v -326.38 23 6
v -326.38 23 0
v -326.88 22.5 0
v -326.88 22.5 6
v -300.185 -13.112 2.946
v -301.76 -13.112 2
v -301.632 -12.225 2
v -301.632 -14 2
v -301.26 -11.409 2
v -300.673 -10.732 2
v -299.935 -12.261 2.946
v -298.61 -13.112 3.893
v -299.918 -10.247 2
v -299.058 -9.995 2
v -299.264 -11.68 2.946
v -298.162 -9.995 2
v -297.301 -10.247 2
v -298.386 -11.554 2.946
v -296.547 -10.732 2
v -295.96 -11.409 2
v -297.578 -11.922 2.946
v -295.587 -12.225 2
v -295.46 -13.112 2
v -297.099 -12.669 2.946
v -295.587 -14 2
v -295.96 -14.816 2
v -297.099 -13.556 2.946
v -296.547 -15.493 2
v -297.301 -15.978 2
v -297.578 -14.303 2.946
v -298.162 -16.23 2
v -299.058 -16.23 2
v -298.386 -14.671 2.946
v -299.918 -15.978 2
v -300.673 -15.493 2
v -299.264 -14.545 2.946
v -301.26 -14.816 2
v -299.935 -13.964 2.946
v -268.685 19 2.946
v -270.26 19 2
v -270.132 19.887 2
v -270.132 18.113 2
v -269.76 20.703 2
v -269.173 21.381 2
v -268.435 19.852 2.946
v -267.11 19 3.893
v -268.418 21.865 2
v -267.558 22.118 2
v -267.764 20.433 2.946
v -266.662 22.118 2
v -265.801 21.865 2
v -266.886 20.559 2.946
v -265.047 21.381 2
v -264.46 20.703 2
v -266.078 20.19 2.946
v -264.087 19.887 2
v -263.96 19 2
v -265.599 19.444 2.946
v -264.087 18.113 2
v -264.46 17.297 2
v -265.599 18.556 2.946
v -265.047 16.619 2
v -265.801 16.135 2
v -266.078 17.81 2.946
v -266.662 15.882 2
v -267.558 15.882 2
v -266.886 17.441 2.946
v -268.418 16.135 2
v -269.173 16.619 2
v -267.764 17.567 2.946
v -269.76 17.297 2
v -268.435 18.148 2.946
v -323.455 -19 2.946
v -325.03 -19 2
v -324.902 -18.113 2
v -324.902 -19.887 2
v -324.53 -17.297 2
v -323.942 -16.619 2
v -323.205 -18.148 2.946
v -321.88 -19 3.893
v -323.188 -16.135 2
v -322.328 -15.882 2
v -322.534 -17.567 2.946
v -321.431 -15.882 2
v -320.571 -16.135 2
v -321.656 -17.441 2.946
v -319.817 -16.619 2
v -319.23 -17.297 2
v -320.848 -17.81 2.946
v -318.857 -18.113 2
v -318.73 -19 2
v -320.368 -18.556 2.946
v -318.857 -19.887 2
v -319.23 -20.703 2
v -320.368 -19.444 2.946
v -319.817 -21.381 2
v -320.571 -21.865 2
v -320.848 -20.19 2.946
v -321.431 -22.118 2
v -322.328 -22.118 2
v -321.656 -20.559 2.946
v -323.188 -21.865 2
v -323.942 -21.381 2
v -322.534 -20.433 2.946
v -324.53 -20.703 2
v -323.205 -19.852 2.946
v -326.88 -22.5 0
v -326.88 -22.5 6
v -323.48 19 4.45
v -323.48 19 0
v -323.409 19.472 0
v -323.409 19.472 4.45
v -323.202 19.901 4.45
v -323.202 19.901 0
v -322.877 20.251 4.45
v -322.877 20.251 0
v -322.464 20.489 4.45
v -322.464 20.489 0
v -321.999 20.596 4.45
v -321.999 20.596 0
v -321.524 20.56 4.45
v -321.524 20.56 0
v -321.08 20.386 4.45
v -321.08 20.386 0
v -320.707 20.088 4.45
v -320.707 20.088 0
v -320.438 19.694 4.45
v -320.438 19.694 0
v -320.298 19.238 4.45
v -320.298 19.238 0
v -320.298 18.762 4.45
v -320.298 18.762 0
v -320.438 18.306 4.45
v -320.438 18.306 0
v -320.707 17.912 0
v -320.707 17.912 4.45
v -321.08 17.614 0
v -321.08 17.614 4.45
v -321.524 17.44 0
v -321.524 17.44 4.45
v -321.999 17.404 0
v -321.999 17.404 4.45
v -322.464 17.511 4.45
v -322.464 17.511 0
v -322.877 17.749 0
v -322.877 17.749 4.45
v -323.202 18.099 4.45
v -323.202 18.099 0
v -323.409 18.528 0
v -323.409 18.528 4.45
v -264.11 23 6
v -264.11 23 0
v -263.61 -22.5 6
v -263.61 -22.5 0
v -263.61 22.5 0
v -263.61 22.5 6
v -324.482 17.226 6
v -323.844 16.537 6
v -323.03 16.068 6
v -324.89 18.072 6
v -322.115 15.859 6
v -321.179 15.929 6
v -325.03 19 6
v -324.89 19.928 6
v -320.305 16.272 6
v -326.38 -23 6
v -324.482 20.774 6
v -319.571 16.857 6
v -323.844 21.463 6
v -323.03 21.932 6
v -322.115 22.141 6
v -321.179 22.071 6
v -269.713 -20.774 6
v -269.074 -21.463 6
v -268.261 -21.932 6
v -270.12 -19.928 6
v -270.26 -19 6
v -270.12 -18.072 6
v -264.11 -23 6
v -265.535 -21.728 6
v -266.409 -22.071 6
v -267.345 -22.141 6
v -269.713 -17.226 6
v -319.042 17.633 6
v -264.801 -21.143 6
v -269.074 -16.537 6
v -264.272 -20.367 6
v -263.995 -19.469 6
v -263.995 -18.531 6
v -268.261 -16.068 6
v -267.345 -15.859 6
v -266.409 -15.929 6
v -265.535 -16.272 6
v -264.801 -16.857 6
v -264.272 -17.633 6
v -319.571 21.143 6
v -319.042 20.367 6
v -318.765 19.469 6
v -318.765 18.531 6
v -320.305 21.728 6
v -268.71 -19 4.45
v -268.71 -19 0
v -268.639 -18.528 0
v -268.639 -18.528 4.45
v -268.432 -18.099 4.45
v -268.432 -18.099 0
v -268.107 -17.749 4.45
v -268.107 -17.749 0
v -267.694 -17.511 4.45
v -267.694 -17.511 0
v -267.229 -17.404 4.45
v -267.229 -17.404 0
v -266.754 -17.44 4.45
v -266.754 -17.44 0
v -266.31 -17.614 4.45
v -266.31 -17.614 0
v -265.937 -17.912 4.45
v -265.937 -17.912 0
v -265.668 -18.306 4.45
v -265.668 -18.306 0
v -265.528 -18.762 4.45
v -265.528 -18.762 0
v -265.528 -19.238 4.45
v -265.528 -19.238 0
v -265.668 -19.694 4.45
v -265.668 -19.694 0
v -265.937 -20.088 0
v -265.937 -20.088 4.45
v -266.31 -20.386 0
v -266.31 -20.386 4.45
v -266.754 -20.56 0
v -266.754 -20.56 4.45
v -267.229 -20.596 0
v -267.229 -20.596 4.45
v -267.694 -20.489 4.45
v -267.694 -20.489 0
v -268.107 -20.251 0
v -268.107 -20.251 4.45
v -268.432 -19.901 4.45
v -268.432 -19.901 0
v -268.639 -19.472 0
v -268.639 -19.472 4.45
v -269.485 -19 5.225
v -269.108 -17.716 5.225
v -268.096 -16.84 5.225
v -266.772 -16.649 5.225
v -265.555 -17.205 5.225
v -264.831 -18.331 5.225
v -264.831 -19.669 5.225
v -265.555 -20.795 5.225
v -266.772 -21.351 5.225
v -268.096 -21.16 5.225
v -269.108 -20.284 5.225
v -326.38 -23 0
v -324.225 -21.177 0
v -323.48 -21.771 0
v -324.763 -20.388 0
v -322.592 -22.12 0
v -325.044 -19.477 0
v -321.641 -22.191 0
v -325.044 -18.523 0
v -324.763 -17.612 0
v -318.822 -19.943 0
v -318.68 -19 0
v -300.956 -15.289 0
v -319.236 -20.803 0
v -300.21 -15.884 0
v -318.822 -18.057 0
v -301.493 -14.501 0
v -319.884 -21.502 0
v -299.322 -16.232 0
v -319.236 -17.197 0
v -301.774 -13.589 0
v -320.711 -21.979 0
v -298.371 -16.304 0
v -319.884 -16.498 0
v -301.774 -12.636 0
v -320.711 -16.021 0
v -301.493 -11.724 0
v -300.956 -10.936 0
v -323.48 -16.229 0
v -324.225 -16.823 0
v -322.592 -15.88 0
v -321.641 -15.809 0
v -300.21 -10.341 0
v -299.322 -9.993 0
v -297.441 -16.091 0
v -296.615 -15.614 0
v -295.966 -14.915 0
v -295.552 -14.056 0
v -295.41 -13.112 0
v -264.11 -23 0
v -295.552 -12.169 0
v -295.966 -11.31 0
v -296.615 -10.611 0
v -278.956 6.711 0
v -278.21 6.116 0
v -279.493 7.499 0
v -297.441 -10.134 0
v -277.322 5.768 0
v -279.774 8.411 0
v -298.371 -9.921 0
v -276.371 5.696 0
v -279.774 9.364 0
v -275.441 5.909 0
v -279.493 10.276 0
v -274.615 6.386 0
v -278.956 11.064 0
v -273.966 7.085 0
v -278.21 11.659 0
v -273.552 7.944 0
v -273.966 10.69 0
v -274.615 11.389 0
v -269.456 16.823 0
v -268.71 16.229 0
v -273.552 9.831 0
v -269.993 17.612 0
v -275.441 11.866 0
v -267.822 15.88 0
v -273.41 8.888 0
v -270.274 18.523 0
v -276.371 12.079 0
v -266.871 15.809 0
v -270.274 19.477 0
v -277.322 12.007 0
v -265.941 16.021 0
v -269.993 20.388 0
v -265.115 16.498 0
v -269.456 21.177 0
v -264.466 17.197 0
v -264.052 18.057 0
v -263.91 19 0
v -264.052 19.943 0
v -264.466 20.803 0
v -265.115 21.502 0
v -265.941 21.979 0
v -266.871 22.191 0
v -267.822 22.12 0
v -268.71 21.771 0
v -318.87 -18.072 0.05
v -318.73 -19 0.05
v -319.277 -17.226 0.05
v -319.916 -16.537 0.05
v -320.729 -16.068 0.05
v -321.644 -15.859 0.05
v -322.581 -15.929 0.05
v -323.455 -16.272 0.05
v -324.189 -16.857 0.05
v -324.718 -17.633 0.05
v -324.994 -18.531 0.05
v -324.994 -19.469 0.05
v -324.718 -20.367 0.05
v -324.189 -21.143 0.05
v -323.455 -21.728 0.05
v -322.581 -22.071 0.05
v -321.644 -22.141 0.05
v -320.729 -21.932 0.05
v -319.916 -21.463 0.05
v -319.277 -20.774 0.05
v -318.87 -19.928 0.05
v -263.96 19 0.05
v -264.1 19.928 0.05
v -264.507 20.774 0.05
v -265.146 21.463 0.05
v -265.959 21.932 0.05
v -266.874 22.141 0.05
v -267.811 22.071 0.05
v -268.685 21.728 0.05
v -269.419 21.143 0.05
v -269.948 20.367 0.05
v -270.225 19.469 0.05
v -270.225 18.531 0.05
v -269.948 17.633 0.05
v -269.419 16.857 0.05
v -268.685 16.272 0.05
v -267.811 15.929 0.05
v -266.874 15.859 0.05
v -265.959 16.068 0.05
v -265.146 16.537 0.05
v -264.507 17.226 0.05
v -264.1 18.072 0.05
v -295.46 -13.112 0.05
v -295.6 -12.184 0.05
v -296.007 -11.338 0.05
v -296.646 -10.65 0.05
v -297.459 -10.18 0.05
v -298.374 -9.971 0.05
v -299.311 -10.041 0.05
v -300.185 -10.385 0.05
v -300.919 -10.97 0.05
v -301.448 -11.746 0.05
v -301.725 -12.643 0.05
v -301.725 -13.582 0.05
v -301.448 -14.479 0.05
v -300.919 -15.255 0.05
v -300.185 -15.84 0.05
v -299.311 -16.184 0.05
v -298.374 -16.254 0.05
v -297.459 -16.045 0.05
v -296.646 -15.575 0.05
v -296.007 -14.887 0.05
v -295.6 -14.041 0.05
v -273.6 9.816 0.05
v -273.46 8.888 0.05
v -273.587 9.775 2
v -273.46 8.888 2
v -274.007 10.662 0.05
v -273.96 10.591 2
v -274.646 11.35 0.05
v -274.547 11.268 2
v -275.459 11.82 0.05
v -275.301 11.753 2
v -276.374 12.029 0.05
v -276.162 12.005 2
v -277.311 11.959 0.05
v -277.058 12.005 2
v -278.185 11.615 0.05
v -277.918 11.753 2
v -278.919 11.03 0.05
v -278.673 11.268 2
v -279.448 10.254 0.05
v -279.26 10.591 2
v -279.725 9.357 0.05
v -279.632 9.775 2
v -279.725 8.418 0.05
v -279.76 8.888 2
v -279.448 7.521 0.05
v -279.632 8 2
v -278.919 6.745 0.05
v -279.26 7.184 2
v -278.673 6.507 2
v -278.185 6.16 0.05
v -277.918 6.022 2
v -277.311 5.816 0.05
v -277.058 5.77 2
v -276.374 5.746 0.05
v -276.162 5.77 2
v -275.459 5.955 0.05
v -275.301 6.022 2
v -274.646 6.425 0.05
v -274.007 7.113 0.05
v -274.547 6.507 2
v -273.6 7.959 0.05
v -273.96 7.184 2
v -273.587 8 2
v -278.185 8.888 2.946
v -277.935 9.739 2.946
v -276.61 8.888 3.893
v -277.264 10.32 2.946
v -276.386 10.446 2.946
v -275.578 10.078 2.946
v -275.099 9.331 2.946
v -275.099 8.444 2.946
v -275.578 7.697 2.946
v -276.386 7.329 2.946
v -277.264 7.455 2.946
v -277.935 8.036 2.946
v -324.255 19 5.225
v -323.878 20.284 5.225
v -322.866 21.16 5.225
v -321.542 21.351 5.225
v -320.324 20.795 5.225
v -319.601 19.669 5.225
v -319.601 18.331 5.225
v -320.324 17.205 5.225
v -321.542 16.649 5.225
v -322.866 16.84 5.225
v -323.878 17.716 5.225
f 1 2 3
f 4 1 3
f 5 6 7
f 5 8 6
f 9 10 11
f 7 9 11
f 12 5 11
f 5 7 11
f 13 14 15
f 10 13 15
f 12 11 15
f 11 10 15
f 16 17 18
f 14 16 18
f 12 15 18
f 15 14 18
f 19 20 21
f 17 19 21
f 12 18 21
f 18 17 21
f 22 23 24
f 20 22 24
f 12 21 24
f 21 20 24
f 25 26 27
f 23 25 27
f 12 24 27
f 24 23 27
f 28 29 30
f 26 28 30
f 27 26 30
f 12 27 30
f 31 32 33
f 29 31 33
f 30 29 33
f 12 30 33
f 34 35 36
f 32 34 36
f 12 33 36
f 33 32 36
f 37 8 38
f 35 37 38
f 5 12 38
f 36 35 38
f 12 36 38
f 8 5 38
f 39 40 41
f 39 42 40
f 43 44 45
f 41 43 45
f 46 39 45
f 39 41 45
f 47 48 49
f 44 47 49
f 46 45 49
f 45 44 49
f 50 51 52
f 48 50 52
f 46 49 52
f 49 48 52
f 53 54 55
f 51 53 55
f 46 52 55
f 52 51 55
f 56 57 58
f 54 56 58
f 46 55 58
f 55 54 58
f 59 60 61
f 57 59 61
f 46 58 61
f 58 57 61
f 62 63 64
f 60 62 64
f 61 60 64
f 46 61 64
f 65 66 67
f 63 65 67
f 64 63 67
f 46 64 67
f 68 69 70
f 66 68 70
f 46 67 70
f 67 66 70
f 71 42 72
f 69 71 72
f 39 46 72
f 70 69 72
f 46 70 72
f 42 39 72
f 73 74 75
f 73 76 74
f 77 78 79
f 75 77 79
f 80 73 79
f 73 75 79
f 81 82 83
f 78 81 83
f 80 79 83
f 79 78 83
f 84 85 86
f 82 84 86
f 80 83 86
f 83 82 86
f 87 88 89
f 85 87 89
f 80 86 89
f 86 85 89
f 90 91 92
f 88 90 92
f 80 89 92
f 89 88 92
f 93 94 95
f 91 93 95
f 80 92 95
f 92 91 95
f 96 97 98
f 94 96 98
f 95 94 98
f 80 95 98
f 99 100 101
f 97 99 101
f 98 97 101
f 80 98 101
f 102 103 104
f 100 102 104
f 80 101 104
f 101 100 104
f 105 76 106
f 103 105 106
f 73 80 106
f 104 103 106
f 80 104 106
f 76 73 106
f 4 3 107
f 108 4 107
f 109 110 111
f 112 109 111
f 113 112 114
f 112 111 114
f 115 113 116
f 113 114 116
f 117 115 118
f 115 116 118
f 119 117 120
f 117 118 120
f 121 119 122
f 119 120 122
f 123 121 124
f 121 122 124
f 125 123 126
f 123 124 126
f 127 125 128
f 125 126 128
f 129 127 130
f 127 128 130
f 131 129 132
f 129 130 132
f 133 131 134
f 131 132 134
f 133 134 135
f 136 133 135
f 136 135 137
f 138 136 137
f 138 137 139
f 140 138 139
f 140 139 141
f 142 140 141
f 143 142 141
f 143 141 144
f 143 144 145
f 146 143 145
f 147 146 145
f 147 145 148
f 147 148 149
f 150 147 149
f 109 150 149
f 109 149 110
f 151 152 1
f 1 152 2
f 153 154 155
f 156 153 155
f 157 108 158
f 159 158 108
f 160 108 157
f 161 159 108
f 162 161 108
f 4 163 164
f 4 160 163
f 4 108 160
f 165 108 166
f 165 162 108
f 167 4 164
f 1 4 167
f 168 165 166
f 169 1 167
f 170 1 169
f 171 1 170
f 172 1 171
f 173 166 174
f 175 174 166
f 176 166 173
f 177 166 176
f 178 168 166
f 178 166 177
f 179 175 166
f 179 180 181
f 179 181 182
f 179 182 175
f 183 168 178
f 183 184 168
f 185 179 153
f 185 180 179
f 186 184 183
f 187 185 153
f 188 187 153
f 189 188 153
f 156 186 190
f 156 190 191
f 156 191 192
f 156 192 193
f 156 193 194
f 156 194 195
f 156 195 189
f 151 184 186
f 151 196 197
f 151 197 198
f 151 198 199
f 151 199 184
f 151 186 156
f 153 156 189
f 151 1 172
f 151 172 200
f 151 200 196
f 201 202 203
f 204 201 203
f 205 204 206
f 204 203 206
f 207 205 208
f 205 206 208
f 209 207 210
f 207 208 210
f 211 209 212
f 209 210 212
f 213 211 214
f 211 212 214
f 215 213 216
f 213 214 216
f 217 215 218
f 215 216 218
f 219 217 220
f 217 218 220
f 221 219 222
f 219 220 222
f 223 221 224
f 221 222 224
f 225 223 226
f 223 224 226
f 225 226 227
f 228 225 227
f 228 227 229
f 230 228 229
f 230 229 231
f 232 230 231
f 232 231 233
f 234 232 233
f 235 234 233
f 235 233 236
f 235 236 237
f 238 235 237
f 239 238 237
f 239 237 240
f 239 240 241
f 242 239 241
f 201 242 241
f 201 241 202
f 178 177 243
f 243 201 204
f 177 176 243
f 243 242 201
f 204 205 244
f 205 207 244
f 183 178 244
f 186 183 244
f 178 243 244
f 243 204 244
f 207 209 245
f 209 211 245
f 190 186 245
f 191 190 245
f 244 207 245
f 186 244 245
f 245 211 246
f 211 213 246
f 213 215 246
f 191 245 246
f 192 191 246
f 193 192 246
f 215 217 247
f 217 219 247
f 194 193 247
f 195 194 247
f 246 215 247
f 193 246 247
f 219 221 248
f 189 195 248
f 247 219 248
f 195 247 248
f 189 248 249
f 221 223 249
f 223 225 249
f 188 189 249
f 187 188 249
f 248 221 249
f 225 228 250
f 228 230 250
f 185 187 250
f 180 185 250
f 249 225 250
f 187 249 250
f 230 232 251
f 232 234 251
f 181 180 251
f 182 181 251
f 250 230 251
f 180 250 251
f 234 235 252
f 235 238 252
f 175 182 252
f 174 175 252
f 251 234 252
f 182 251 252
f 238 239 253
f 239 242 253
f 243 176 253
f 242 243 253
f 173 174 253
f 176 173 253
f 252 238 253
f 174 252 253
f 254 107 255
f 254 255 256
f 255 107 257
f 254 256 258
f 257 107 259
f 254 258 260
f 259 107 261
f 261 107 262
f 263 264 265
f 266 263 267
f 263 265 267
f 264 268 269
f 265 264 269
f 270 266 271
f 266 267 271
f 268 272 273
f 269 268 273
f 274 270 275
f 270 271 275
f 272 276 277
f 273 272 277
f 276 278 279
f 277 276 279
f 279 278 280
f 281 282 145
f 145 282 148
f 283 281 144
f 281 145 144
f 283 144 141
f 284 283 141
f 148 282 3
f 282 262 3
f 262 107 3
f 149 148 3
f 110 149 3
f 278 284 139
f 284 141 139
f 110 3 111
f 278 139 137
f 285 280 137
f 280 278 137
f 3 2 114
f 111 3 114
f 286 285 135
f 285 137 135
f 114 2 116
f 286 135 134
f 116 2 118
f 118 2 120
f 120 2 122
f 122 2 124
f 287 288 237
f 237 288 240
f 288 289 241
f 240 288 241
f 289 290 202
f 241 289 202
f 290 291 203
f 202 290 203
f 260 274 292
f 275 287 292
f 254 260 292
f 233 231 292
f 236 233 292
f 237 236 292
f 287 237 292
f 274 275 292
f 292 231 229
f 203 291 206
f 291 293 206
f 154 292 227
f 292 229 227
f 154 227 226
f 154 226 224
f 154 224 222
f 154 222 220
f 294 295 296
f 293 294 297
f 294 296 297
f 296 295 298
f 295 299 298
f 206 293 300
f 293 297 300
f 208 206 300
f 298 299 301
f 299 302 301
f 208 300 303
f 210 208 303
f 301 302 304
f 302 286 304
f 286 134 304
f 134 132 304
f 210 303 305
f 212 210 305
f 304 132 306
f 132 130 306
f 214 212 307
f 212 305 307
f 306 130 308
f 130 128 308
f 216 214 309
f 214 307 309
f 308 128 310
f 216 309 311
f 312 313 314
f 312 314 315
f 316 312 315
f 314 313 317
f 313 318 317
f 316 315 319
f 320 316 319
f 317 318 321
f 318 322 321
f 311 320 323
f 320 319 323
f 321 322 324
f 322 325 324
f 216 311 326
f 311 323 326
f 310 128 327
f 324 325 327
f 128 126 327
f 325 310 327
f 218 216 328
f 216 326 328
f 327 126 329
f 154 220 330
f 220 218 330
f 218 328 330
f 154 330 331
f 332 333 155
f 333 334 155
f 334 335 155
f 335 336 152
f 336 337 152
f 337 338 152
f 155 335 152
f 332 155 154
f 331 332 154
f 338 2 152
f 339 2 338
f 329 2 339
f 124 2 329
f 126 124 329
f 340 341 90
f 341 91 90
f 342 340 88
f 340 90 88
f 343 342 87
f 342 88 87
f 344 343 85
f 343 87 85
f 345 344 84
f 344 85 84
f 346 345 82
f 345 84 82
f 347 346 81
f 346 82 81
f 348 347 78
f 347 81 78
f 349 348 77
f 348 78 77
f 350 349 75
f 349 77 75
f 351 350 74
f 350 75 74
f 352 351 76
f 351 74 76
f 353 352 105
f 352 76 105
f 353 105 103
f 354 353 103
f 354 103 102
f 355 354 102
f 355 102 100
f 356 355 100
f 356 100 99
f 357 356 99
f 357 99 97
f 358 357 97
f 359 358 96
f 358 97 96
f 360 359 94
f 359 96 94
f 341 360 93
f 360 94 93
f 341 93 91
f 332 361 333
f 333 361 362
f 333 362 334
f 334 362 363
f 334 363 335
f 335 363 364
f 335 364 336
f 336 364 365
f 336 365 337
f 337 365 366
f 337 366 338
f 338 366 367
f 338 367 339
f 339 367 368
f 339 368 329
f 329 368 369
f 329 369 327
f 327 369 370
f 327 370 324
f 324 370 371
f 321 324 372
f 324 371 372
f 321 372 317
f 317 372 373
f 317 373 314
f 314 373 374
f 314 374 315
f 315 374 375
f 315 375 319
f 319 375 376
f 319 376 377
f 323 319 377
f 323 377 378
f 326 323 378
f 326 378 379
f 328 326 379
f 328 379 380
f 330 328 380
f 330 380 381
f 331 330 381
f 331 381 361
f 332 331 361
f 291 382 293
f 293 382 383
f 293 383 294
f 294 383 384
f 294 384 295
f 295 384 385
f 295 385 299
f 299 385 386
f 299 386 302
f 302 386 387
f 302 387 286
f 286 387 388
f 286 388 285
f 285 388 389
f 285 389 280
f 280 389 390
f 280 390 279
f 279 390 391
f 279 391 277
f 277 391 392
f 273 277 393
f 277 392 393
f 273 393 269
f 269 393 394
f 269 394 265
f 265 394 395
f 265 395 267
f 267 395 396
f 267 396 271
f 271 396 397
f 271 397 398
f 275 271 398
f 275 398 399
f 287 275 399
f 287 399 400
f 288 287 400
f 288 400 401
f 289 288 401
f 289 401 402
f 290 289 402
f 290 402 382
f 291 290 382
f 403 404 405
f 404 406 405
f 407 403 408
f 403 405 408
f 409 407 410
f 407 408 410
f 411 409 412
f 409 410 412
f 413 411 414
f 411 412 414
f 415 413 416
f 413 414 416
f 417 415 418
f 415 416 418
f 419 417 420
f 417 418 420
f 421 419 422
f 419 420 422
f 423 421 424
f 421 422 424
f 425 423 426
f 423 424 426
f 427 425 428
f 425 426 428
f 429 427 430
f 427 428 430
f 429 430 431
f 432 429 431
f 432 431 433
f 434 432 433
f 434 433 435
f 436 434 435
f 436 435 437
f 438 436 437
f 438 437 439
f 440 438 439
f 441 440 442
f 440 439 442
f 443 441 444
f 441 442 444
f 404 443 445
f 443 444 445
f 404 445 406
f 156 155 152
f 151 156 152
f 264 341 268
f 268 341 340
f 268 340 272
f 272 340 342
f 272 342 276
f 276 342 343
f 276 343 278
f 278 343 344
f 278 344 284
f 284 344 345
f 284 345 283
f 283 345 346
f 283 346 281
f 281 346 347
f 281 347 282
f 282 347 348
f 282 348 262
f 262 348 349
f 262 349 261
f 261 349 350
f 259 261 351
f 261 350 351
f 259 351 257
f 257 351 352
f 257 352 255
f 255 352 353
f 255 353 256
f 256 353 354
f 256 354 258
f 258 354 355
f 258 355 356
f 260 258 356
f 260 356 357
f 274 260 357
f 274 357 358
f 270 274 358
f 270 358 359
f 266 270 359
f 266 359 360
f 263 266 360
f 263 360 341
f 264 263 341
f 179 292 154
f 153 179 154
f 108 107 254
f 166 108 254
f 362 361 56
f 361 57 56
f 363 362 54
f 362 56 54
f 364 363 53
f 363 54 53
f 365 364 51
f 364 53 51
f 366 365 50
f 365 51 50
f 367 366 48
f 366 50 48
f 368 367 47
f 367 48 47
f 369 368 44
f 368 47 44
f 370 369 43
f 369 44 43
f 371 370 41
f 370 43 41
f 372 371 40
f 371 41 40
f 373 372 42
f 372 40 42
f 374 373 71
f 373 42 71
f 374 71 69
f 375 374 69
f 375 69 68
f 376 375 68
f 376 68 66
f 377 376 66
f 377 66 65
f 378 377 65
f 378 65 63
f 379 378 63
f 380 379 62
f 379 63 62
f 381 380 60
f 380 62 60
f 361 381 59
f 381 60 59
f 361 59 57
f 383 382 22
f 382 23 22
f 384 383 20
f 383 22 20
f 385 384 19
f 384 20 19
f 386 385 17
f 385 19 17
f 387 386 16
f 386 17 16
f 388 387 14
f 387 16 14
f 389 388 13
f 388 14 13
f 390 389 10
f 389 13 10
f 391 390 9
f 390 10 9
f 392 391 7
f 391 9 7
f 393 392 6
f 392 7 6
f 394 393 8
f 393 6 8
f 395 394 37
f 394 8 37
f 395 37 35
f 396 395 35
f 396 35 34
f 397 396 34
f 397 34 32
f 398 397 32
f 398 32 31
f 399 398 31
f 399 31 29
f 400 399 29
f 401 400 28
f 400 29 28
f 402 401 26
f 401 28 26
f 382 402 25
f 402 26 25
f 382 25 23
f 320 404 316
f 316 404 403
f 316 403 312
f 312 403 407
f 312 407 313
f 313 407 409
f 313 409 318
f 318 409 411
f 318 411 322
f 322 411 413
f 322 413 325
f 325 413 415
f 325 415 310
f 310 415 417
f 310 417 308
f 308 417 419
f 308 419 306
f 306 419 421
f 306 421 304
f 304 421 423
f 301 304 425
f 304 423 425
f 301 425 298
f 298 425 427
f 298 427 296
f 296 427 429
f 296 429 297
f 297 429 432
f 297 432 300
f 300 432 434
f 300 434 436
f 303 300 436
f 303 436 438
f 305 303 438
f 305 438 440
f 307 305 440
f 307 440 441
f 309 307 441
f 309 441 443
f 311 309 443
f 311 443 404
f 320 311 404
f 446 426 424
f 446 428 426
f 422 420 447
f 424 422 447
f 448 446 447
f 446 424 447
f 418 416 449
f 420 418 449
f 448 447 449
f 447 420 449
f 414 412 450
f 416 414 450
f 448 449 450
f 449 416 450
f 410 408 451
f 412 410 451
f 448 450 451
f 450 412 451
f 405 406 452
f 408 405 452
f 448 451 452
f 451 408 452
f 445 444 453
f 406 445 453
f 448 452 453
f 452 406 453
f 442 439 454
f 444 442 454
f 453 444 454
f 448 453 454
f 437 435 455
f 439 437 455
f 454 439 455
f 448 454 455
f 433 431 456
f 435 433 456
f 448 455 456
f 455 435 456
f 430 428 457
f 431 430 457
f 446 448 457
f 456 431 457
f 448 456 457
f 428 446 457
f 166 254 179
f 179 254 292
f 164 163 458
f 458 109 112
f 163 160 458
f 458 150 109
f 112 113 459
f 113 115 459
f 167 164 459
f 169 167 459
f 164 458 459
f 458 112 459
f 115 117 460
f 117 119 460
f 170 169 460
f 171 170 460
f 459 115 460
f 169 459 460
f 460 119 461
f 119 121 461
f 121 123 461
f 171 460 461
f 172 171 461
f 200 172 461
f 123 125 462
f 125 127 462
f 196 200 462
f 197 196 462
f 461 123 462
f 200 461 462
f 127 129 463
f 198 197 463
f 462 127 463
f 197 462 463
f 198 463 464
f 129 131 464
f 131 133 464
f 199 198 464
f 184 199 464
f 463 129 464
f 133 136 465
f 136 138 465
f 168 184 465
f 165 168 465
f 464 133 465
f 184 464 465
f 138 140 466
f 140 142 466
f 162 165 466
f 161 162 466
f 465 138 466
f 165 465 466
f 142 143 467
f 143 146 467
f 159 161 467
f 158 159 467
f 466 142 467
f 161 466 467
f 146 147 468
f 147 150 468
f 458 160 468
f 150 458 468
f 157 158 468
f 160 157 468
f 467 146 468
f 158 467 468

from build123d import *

# Parameters (mm, degrees)
P_IDAT_VYSUNUT_M2_DEPTH                           = 6
F_6_3_6_3_PR_M_R_D_RY1_D                          = 6.3
F_6_3_6_3_PR_M_R_D_RY1_DEPTH                      = 2
F_6_3_6_3_PR_M_R_D_RY1_CSINK_D                    = 6.4
F_6_3_6_3_PR_M_R_D_RY1_CSINK_ANGLE                = 90
F_6_3_6_3_PR_M_R_D_RY1_TIP                        = 1.89271095
KU_ELOV_ZAHLOUBEN_PRO_M3_ROUBU_SE_Z_P_D           = 3.2
KU_ELOV_ZAHLOUBEN_PRO_M3_ROUBU_SE_Z_P_DEPTH       = 6
KU_ELOV_ZAHLOUBEN_PRO_M3_ROUBU_SE_Z_P_CSINK_D     = 6.3
KU_ELOV_ZAHLOUBEN_PRO_M3_ROUBU_SE_Z_P_CSINK_ANGLE = 90


with BuildPart() as part:
    # Skica1 → Přidat vysunutím2 (new body)
    with BuildSketch(Plane.XY):
        Polygon((-326.879657855, 22.5), (-326.879657855, -22.5), (-326.379657855, -23), (-264.109857855, -23), (-263.609857855, -22.5), (-263.609857855, 22.5), (-264.109857855, 23), (-326.379657855, 23), align=None)
    extrude(amount=P_IDAT_VYSUNUT_M2_DEPTH)

    # Ø6.3 (6.3) průměr díry1
    with Locations(Plane(origin=(-321.879657855, -19, 0), x_dir=(-1, 0, 0), z_dir=(0, 0, -1))):
        with Locations((0, 0), (-54.7698, 38), (-45.2698, 27.8875), (-23.2698, 5.8875)):
            CounterSinkHole(F_6_3_6_3_PR_M_R_D_RY1_D / 2, F_6_3_6_3_PR_M_R_D_RY1_CSINK_D / 2, depth=F_6_3_6_3_PR_M_R_D_RY1_DEPTH, counter_sink_angle=F_6_3_6_3_PR_M_R_D_RY1_CSINK_ANGLE)
            with Locations((0, 0, -(F_6_3_6_3_PR_M_R_D_RY1_DEPTH + F_6_3_6_3_PR_M_R_D_RY1_TIP / 2))):  # 118° drill point
                Cone(0, F_6_3_6_3_PR_M_R_D_RY1_D / 2, F_6_3_6_3_PR_M_R_D_RY1_TIP, mode=Mode.SUBTRACT)

    # Kuželové zahloubení pro M3 šroubu se zápustnou hlavou plochou1
    with Locations(Plane(origin=(-321.879657855, 19, 6), x_dir=(1, 0, 0), z_dir=(0, 0, 1))):
        with Locations((0, 0), (54.7698, -38)):
            CounterSinkHole(KU_ELOV_ZAHLOUBEN_PRO_M3_ROUBU_SE_Z_P_D / 2, KU_ELOV_ZAHLOUBEN_PRO_M3_ROUBU_SE_Z_P_CSINK_D / 2, depth=KU_ELOV_ZAHLOUBEN_PRO_M3_ROUBU_SE_Z_P_DEPTH, counter_sink_angle=KU_ELOV_ZAHLOUBEN_PRO_M3_ROUBU_SE_Z_P_CSINK_ANGLE)


solid = part.part
